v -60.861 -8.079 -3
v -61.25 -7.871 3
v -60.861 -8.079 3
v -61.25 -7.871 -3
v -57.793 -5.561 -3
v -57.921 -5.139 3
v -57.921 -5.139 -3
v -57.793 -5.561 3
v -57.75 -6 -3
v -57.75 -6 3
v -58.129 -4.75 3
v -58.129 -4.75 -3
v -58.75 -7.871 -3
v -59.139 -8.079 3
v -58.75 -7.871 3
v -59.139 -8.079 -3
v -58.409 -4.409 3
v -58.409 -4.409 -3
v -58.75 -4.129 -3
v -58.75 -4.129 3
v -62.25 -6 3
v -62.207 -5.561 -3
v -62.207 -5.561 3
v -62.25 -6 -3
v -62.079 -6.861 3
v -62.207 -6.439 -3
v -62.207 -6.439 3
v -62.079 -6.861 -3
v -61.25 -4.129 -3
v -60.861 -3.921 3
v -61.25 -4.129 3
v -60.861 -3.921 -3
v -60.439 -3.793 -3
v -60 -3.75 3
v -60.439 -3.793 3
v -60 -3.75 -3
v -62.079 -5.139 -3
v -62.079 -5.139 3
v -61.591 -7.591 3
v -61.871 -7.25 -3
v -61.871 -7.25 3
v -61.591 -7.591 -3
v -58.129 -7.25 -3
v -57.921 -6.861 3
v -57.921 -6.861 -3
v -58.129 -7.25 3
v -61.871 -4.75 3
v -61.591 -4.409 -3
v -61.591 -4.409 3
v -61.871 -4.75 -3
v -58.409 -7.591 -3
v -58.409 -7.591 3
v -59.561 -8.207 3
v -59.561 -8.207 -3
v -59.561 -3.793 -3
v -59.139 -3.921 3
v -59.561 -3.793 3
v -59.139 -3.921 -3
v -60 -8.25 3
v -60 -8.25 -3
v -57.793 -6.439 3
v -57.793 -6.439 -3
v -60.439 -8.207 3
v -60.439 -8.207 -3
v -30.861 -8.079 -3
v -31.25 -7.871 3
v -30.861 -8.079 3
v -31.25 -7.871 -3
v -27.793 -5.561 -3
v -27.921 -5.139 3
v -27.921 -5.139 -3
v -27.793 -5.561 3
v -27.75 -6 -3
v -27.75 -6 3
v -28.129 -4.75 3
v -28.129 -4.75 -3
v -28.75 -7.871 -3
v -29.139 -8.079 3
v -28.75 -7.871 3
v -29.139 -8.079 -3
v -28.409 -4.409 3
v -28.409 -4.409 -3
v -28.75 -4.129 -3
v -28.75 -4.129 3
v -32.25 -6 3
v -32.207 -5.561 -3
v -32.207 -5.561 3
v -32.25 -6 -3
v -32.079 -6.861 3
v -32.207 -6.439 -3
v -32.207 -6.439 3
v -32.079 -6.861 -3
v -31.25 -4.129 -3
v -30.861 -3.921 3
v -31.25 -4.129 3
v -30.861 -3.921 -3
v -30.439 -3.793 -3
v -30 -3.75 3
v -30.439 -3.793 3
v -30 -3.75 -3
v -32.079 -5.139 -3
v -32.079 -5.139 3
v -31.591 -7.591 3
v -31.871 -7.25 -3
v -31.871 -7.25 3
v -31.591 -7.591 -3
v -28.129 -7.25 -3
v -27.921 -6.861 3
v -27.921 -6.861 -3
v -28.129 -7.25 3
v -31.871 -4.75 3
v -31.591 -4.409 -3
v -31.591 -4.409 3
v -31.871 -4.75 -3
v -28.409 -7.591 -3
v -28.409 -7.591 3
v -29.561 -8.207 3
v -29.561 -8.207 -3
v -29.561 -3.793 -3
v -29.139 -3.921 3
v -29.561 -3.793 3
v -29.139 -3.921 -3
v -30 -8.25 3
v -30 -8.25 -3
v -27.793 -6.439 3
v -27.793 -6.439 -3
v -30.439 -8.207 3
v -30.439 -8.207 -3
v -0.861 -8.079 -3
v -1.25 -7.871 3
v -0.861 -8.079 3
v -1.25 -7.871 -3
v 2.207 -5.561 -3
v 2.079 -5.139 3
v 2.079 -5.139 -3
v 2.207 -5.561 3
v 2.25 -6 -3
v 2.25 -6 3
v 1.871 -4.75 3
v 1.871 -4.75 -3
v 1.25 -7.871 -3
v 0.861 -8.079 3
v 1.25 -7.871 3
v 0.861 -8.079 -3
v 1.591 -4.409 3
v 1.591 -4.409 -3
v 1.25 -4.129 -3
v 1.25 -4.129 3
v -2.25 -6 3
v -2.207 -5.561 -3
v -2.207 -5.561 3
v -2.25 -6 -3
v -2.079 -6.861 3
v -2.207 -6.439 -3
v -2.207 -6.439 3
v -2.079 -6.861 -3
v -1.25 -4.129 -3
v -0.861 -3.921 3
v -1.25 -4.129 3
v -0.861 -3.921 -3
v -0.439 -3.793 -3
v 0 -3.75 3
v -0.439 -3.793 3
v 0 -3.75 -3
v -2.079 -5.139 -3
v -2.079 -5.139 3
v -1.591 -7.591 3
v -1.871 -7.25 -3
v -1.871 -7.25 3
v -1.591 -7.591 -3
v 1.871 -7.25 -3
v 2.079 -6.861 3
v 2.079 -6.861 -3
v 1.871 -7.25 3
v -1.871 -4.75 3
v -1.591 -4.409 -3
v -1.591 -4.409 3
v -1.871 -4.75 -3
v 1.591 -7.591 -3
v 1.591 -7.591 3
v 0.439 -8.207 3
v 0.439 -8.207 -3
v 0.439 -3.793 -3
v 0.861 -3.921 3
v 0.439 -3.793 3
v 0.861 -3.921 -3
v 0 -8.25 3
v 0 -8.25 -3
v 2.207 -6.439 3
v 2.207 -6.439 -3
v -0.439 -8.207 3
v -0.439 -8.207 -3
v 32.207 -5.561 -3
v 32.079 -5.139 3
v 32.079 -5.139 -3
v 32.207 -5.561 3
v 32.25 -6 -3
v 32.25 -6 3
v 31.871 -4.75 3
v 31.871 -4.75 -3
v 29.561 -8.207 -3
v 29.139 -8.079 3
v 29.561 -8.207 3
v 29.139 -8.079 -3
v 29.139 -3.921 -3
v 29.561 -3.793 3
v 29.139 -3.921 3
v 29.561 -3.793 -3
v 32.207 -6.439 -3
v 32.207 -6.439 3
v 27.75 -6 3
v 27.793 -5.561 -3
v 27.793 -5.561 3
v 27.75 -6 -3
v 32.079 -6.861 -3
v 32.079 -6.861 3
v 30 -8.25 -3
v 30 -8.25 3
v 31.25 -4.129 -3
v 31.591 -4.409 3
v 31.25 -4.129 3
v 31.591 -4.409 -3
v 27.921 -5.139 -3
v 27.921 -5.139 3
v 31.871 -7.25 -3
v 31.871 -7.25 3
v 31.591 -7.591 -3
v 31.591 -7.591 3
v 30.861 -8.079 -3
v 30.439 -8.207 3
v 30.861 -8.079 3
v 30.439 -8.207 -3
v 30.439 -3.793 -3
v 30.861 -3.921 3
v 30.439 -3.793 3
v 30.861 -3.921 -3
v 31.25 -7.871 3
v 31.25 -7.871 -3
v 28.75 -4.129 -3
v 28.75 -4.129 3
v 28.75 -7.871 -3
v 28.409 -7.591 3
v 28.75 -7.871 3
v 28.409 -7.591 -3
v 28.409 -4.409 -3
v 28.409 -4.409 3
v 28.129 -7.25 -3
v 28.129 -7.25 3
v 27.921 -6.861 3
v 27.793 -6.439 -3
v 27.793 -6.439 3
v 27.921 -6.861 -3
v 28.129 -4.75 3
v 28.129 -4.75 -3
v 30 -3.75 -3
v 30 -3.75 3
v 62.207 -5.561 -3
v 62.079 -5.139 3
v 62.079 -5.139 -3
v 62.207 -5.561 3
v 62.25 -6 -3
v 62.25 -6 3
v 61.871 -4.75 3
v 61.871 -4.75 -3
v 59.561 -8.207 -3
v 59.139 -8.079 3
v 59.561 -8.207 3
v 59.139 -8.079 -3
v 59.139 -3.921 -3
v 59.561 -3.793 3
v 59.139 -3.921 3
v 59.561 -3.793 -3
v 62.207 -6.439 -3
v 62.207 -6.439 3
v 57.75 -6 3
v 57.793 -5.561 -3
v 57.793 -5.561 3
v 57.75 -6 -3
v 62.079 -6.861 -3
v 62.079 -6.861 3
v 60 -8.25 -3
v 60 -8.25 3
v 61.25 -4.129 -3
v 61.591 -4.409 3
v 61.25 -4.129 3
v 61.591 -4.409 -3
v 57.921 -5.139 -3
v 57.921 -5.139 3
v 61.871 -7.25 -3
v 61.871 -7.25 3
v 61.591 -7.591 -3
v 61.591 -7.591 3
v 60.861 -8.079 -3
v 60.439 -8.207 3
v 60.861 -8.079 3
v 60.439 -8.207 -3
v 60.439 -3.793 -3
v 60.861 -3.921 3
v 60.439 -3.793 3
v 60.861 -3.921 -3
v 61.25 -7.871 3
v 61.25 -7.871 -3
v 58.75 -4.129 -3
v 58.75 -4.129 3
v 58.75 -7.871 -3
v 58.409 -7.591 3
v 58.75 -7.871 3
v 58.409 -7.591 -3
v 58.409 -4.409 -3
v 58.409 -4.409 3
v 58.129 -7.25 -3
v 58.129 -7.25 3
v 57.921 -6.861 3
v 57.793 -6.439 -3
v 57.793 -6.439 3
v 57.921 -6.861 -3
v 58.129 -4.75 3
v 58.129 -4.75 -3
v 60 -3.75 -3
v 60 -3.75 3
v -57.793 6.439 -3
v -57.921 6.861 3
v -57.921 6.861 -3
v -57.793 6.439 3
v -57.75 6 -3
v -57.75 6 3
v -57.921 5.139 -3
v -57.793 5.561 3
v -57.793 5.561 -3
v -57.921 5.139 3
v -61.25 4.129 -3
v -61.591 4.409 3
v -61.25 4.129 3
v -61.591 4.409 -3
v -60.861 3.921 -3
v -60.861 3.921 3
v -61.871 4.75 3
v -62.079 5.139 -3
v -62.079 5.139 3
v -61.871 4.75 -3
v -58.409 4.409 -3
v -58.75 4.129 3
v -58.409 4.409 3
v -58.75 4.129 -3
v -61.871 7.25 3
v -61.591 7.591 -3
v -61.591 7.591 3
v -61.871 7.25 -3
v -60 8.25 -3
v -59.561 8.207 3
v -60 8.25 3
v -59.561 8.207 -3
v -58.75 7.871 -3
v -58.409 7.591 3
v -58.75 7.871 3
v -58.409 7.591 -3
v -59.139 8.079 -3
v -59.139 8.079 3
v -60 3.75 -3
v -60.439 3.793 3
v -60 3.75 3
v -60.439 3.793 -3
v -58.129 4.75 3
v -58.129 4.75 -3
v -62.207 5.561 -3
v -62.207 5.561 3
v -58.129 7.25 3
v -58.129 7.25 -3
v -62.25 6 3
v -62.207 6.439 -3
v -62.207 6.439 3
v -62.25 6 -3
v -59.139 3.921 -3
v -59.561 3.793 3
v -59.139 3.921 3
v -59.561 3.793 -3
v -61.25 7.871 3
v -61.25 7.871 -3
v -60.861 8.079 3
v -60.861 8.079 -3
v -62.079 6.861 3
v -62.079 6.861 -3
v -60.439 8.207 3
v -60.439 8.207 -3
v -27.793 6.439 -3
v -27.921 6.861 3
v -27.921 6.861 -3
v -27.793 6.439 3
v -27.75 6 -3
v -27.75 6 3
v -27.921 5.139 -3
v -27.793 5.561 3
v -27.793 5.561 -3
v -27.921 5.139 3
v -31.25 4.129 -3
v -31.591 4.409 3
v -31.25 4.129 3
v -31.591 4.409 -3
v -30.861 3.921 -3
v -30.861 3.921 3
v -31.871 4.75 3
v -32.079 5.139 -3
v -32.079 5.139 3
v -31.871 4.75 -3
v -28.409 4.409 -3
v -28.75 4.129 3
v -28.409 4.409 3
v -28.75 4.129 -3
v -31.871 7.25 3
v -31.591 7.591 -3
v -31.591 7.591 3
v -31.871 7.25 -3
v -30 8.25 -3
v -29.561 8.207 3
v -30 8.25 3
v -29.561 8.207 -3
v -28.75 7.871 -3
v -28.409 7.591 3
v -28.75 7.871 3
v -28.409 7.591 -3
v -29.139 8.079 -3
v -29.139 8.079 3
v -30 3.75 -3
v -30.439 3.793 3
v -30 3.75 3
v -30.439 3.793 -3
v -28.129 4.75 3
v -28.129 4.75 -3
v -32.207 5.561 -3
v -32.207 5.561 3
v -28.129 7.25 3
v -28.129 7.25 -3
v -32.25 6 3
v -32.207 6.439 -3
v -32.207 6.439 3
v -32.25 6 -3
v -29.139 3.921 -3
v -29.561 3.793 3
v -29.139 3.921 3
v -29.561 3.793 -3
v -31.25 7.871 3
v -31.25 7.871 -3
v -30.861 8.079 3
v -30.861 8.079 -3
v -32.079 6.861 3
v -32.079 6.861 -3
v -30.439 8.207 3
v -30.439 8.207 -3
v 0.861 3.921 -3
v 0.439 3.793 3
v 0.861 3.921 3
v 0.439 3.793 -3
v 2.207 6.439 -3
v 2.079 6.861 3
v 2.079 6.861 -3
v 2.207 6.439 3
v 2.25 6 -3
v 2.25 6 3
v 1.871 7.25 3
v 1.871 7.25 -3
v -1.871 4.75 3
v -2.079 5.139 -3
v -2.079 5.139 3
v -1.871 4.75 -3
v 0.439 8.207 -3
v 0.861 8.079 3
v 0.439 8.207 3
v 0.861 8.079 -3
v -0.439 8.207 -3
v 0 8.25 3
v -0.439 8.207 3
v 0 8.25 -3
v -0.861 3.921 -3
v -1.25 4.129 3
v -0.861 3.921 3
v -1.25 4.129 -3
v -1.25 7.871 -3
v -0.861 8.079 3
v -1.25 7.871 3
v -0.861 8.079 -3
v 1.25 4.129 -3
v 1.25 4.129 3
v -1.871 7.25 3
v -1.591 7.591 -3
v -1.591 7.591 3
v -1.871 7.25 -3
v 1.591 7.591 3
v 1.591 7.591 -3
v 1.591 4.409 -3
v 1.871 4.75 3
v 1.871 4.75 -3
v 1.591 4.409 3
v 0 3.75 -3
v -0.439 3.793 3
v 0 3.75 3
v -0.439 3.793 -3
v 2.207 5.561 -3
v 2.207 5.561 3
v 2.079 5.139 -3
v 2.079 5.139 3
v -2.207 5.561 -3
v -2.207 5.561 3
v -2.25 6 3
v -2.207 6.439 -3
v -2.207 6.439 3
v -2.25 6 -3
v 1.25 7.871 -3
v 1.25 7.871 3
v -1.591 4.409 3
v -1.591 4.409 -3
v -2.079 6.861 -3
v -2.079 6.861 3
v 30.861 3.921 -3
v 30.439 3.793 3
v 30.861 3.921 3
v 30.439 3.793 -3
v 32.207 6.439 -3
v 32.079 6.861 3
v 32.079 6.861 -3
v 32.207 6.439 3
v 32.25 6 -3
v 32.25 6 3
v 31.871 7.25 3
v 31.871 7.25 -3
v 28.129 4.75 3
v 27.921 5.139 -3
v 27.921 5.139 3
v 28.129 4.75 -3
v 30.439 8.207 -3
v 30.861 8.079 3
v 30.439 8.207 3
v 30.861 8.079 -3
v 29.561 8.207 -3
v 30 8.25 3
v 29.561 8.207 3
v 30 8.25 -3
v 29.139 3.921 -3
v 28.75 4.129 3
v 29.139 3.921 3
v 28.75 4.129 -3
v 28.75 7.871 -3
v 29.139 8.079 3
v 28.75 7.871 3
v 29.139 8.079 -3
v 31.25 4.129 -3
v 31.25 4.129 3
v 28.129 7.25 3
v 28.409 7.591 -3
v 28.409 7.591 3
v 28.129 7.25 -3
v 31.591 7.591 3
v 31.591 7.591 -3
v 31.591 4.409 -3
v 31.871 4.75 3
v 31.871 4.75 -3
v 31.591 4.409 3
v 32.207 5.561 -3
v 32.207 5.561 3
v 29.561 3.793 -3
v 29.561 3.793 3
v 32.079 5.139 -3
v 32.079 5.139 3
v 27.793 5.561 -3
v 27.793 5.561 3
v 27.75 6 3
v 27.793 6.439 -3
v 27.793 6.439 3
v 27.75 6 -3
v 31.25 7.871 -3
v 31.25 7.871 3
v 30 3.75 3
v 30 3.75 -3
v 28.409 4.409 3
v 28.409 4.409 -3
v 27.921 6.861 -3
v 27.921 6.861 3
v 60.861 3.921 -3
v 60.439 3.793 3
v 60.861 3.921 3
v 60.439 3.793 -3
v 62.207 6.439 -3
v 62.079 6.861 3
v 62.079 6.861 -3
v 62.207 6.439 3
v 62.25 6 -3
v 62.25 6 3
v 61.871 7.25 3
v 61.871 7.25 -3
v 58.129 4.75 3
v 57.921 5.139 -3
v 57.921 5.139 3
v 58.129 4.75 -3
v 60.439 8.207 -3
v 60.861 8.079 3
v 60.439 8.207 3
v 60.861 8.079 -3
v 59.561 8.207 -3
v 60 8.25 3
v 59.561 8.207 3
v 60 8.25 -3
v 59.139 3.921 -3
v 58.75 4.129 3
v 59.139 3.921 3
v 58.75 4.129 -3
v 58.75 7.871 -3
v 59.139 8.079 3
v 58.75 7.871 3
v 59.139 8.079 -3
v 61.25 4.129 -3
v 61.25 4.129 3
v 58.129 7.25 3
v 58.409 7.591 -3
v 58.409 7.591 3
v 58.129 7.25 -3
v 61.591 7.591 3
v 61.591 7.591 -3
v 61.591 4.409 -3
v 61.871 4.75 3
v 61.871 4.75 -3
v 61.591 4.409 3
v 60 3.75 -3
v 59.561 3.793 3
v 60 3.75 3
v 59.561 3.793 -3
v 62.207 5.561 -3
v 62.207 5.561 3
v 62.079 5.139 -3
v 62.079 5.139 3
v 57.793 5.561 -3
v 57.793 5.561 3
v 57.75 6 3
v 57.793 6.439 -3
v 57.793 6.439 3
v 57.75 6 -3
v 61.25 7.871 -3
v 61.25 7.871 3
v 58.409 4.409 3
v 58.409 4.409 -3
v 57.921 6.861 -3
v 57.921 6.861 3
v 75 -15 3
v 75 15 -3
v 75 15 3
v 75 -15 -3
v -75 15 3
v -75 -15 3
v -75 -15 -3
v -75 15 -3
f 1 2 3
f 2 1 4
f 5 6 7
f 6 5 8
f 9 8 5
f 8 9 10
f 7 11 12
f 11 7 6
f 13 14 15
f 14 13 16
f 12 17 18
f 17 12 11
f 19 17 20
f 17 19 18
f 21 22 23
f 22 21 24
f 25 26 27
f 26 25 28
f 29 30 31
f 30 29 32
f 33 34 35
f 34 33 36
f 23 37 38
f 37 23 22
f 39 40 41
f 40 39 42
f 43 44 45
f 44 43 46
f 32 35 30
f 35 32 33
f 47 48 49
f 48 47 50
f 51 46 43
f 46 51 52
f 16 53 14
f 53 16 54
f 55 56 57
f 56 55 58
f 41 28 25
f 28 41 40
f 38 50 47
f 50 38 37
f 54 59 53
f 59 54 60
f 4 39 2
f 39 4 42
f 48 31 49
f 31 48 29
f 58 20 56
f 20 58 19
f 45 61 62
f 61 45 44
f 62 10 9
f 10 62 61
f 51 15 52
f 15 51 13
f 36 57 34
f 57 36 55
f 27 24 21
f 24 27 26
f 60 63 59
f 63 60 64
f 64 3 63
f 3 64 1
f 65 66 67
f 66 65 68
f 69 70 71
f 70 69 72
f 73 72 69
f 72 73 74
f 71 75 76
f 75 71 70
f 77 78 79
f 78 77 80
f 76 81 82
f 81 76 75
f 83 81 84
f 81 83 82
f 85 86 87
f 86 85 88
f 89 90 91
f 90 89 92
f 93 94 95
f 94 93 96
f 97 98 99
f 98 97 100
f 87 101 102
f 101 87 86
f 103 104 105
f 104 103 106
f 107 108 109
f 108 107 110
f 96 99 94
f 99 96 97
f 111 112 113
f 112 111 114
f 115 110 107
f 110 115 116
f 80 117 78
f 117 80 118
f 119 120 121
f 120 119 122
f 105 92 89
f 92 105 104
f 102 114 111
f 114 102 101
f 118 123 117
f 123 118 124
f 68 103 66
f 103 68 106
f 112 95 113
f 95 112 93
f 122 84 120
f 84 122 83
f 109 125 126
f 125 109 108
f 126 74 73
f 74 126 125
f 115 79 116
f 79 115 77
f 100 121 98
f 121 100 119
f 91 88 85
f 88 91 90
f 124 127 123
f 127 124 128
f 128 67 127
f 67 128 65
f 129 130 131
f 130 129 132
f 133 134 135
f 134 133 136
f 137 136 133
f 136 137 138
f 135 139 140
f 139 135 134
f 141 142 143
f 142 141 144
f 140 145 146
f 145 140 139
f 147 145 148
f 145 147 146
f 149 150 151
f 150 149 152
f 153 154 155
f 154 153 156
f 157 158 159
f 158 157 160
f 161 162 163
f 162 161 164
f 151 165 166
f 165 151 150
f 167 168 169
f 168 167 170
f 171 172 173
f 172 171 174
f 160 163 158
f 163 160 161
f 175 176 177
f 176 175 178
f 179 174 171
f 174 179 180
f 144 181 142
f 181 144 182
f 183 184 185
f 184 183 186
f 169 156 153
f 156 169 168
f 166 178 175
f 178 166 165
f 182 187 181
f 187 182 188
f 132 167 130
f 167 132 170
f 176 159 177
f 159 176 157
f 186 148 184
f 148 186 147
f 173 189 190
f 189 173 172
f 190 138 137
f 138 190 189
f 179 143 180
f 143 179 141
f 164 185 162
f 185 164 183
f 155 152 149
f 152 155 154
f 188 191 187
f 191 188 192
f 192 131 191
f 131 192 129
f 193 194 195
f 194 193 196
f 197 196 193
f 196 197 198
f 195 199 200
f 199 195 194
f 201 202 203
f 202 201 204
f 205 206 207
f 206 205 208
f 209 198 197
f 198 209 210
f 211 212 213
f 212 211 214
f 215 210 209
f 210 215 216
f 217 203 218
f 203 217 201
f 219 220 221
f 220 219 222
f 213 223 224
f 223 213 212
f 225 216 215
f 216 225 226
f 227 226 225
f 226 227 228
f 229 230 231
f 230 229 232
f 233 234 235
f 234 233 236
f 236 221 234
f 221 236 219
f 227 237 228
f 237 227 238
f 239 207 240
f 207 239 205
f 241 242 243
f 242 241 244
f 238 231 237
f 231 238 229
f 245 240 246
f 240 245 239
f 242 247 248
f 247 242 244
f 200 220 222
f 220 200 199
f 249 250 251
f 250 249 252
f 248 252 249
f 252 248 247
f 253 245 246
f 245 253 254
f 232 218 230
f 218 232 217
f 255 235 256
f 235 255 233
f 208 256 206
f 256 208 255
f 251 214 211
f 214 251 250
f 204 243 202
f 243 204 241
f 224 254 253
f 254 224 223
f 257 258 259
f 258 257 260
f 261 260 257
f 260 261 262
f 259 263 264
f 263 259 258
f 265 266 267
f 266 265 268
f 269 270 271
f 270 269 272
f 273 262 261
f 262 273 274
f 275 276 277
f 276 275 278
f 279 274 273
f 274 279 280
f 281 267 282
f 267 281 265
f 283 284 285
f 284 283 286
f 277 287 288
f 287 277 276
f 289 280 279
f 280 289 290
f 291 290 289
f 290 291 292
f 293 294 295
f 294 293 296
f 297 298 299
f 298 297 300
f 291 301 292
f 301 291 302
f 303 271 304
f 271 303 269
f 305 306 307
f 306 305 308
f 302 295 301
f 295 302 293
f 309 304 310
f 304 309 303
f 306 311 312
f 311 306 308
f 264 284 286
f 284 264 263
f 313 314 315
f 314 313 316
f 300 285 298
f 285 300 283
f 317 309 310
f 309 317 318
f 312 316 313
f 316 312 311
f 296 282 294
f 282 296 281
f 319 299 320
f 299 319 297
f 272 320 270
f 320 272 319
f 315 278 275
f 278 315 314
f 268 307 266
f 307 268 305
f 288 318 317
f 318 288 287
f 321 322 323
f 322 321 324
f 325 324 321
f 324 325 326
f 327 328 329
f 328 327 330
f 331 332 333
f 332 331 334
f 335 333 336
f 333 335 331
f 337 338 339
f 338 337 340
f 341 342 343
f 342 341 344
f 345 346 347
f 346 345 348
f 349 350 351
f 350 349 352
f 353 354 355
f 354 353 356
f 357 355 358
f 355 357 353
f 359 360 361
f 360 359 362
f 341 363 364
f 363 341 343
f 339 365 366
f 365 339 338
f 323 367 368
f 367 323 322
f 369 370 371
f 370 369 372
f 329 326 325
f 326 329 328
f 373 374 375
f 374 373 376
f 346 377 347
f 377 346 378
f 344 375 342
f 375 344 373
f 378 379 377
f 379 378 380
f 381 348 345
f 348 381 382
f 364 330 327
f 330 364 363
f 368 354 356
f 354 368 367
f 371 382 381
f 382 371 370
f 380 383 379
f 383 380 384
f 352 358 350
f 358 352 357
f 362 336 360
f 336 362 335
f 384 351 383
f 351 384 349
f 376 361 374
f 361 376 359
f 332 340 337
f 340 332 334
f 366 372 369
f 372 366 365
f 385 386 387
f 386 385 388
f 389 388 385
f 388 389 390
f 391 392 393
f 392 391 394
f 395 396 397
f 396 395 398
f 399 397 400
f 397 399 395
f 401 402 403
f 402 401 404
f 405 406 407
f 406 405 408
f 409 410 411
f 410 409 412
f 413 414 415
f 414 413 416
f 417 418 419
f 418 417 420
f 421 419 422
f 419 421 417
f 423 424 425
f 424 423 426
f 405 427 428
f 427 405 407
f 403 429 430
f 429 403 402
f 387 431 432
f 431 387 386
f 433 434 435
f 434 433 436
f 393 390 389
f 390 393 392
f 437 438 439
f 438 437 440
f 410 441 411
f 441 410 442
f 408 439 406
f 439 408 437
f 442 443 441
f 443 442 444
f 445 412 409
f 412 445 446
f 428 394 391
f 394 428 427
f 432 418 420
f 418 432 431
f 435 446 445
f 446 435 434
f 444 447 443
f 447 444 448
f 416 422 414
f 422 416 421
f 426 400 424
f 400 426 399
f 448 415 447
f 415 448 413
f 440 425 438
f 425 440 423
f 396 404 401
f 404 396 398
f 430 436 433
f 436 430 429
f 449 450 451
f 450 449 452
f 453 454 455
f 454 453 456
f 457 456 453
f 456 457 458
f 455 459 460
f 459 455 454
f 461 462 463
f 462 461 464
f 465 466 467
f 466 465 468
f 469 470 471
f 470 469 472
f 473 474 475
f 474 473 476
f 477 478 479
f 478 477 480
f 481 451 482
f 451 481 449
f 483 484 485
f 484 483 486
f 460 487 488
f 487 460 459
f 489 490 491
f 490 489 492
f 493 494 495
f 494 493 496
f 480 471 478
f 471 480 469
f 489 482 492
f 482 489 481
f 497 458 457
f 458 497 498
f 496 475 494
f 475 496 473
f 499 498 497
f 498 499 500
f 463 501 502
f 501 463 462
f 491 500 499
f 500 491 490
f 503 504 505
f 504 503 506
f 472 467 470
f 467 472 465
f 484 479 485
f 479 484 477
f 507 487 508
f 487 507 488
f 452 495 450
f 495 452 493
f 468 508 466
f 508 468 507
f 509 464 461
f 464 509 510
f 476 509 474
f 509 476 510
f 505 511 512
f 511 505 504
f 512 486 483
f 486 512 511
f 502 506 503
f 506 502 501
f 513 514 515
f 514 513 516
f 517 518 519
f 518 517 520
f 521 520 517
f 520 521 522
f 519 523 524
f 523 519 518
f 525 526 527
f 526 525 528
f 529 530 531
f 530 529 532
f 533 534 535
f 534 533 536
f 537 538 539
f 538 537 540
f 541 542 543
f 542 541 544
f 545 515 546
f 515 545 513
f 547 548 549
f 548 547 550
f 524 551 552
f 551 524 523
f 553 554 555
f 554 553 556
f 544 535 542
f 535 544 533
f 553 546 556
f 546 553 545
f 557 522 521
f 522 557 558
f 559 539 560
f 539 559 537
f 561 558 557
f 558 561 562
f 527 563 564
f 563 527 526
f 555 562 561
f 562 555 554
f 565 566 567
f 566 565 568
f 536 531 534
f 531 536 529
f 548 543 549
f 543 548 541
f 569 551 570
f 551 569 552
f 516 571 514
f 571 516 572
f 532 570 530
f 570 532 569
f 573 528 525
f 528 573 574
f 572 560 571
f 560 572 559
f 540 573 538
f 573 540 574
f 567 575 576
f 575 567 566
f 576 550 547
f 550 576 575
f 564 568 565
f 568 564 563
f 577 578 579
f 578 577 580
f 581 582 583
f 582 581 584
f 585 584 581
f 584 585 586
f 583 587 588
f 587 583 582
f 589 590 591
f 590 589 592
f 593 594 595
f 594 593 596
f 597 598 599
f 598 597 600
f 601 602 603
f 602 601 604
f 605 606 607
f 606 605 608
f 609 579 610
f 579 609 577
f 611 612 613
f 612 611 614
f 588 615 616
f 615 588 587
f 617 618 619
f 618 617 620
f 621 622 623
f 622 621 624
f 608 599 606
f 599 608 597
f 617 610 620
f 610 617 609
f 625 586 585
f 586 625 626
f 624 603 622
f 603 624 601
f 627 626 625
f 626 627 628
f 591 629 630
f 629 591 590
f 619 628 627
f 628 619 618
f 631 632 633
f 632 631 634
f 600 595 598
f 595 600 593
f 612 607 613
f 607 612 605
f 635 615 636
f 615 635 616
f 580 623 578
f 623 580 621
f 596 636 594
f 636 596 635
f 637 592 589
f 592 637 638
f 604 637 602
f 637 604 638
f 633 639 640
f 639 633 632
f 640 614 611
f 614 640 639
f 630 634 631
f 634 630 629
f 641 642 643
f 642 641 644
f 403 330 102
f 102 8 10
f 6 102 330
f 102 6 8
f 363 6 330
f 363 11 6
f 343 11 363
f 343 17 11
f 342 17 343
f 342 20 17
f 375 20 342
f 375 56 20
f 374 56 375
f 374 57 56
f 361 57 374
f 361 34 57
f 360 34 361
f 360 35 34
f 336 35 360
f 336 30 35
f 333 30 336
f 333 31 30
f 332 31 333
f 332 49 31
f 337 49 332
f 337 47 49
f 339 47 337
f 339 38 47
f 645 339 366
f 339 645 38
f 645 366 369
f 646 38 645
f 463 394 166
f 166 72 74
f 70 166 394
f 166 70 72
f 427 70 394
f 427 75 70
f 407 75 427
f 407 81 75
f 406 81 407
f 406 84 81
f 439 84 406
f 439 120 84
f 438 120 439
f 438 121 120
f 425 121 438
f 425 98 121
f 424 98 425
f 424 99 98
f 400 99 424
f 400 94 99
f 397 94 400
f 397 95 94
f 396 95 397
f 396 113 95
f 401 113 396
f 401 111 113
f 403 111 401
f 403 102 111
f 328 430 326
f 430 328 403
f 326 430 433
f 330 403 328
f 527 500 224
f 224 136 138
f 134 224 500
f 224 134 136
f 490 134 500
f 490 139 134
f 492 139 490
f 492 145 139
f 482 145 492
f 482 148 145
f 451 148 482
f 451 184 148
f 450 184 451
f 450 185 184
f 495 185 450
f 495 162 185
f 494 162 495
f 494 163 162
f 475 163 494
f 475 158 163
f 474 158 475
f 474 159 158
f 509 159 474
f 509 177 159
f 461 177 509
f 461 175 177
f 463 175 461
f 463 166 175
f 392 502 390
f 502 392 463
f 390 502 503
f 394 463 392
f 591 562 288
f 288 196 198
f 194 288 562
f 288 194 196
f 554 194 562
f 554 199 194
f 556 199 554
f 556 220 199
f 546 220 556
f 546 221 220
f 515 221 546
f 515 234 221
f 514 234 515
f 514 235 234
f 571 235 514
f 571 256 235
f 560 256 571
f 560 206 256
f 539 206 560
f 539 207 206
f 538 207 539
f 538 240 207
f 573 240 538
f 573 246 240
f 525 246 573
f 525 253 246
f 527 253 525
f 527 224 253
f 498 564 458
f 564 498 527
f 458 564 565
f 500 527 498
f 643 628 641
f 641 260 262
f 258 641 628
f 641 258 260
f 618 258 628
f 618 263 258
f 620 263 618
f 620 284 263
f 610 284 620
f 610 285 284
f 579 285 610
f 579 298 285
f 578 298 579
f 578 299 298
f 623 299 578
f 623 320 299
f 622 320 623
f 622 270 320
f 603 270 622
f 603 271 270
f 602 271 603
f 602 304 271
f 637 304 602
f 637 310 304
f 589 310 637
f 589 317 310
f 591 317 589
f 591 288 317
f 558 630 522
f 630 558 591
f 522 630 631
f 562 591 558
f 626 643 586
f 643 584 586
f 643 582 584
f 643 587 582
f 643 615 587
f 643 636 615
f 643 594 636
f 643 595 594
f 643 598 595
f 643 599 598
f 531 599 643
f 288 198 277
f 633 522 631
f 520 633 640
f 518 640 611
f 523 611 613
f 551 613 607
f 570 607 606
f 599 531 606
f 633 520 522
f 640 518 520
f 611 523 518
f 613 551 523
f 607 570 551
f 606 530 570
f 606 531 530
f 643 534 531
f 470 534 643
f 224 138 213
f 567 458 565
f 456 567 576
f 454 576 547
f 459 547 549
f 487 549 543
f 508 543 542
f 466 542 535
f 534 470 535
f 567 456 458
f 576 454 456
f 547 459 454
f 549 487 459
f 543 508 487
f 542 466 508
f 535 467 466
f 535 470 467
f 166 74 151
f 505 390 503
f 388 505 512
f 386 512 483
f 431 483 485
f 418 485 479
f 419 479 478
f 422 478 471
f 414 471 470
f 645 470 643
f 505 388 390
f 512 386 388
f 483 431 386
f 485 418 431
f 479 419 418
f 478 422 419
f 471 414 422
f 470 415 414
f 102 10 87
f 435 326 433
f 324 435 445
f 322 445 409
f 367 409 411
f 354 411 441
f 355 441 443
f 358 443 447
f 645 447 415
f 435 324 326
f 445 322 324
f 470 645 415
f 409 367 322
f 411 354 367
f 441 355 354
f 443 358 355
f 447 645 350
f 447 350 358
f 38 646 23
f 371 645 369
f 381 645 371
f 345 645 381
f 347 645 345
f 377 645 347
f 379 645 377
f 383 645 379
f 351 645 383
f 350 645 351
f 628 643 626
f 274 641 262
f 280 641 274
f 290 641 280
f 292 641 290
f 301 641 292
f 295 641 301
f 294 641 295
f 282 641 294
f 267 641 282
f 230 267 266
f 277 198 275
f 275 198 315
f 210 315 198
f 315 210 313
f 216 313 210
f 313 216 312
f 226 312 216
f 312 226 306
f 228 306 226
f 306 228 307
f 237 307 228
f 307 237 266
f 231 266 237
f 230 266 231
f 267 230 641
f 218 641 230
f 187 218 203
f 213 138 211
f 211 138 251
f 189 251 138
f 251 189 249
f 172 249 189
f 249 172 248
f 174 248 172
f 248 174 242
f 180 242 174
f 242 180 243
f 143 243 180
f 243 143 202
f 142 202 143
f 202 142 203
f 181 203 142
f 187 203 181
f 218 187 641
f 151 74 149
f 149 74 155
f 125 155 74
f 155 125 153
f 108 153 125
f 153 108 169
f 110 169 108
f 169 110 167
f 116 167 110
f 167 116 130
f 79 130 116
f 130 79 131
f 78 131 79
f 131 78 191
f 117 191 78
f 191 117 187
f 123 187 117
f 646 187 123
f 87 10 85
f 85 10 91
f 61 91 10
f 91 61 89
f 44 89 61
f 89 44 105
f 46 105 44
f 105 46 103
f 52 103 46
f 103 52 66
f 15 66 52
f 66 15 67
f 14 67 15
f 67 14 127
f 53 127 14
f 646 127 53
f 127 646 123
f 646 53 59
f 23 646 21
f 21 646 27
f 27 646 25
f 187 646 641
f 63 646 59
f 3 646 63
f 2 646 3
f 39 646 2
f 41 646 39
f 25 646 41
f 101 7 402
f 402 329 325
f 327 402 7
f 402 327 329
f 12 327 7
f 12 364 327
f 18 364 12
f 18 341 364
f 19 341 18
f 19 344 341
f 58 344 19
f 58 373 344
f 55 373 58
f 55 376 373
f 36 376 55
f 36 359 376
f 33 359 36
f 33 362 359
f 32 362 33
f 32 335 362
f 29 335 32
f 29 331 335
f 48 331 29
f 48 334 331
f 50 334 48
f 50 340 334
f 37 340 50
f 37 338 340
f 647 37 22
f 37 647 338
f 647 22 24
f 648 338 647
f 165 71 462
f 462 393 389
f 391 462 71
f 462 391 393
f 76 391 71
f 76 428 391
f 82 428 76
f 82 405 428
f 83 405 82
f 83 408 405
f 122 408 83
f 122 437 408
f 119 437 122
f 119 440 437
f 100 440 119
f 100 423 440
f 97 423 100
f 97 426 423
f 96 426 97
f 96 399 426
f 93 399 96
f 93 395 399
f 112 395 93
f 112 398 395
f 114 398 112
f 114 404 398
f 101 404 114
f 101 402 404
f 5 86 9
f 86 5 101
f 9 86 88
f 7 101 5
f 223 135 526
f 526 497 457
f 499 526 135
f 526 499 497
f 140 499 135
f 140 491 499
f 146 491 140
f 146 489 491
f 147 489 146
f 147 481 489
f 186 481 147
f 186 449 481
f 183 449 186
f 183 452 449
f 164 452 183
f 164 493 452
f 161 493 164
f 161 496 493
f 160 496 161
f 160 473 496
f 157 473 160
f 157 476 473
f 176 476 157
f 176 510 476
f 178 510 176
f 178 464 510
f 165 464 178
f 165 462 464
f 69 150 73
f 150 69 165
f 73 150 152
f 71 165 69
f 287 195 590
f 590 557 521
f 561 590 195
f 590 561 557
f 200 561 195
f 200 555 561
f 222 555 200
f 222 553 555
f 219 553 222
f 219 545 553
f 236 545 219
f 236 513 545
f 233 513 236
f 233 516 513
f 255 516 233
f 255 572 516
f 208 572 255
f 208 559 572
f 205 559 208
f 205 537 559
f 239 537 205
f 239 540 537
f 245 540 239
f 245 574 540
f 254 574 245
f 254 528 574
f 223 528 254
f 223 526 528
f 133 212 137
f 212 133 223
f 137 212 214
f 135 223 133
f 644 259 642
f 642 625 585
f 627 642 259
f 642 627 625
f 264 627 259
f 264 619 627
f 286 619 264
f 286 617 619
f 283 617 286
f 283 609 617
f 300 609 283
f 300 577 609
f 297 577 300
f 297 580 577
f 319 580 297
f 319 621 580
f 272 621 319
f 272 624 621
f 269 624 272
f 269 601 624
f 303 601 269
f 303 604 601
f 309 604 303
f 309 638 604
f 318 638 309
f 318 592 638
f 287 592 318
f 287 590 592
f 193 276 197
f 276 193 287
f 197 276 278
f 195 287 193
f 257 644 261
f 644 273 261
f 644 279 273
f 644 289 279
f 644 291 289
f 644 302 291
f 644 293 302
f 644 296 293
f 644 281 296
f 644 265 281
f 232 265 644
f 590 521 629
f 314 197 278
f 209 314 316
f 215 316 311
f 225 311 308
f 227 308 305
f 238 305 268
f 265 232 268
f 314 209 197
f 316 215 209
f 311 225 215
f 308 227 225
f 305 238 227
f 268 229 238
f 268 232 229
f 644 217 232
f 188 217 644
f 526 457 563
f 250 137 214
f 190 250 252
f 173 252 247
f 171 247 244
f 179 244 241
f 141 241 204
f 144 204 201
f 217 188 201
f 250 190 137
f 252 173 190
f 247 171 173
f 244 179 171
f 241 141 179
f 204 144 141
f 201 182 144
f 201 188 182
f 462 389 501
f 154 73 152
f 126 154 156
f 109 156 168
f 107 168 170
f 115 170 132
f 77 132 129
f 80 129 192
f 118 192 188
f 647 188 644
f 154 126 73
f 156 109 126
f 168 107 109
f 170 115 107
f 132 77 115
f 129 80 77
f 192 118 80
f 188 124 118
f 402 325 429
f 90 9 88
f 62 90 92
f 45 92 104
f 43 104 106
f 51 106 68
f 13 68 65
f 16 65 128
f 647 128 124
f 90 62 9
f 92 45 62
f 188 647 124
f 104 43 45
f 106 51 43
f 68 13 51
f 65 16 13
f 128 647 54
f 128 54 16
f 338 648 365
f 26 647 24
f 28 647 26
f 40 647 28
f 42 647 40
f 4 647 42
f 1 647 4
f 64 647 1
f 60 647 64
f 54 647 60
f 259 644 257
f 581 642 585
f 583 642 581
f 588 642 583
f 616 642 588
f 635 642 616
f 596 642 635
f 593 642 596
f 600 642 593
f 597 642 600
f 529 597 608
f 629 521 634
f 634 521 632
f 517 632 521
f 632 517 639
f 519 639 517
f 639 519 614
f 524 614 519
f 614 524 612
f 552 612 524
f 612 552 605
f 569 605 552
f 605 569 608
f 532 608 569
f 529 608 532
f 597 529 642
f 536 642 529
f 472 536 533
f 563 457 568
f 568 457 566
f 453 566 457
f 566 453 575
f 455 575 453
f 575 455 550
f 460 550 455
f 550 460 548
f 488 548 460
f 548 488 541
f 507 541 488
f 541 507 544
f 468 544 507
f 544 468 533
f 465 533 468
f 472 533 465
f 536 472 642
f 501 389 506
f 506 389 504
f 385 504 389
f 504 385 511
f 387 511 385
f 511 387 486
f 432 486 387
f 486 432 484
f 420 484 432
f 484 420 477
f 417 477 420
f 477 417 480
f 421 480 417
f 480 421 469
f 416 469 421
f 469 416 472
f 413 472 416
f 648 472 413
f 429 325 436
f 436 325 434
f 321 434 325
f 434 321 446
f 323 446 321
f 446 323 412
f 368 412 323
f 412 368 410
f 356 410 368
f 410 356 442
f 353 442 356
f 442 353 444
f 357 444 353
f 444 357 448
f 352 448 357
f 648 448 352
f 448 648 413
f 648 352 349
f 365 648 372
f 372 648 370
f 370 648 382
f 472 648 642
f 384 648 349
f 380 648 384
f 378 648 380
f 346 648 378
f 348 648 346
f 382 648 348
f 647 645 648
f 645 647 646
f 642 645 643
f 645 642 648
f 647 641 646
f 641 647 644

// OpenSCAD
$fn = 32;

// ----------------------------------------------------------------------
// Hole bar, 5 x Ø4.5
// tworows layout, 15 mm edge offset
// ----------------------------------------------------------------------

// --- parameters (mm) ---
bar_w = 30;       // bar width (Y)
bar_t = 6;        // bar thickness (Z)
holes = 5;        // holes per row
hole_d = 4.5;     // hole diameter
edge = 15;        // offset from the bar end to the first hole
pitch = 30;       // pitch between neighbouring holes
row_offset = 12;  // distance between the two rows

// --- derived feature positions (mm) ---
span = (holes - 1) * pitch;   // = 120   distance between the end holes
bar_l = span + 2 * edge;      // = 150   overall bar length
start_x = -bar_l / 2 + edge;  // = -60   X of the first hole
feature_centers = [
  [start_x + 0 * pitch, -row_offset / 2],
  [start_x + 1 * pitch, -row_offset / 2],
  [start_x + 2 * pitch, -row_offset / 2],
  [start_x + 3 * pitch, -row_offset / 2],
  [start_x + 4 * pitch, -row_offset / 2]
];   // hole centres of the first row
row2_centers = [
  [start_x + 0 * pitch, row_offset / 2],
  [start_x + 1 * pitch, row_offset / 2],
  [start_x + 2 * pitch, row_offset / 2],
  [start_x + 3 * pitch, row_offset / 2],
  [start_x + 4 * pitch, row_offset / 2]
];   // hole centres of the second row

// bar with two rows of holes, both read from their own centre arrays
difference() {
  translate([-bar_l / 2, -bar_w / 2, -bar_t / 2]) cube([bar_l, bar_w, bar_t]);
  for (centre = feature_centers)
    translate([centre[0], centre[1], 0])
      cylinder(d = hole_d, h = bar_t + 2, center = true);
  for (centre = row2_centers)
    translate([centre[0], centre[1], 0])
      cylinder(d = hole_d, h = bar_t + 2, center = true);
}
